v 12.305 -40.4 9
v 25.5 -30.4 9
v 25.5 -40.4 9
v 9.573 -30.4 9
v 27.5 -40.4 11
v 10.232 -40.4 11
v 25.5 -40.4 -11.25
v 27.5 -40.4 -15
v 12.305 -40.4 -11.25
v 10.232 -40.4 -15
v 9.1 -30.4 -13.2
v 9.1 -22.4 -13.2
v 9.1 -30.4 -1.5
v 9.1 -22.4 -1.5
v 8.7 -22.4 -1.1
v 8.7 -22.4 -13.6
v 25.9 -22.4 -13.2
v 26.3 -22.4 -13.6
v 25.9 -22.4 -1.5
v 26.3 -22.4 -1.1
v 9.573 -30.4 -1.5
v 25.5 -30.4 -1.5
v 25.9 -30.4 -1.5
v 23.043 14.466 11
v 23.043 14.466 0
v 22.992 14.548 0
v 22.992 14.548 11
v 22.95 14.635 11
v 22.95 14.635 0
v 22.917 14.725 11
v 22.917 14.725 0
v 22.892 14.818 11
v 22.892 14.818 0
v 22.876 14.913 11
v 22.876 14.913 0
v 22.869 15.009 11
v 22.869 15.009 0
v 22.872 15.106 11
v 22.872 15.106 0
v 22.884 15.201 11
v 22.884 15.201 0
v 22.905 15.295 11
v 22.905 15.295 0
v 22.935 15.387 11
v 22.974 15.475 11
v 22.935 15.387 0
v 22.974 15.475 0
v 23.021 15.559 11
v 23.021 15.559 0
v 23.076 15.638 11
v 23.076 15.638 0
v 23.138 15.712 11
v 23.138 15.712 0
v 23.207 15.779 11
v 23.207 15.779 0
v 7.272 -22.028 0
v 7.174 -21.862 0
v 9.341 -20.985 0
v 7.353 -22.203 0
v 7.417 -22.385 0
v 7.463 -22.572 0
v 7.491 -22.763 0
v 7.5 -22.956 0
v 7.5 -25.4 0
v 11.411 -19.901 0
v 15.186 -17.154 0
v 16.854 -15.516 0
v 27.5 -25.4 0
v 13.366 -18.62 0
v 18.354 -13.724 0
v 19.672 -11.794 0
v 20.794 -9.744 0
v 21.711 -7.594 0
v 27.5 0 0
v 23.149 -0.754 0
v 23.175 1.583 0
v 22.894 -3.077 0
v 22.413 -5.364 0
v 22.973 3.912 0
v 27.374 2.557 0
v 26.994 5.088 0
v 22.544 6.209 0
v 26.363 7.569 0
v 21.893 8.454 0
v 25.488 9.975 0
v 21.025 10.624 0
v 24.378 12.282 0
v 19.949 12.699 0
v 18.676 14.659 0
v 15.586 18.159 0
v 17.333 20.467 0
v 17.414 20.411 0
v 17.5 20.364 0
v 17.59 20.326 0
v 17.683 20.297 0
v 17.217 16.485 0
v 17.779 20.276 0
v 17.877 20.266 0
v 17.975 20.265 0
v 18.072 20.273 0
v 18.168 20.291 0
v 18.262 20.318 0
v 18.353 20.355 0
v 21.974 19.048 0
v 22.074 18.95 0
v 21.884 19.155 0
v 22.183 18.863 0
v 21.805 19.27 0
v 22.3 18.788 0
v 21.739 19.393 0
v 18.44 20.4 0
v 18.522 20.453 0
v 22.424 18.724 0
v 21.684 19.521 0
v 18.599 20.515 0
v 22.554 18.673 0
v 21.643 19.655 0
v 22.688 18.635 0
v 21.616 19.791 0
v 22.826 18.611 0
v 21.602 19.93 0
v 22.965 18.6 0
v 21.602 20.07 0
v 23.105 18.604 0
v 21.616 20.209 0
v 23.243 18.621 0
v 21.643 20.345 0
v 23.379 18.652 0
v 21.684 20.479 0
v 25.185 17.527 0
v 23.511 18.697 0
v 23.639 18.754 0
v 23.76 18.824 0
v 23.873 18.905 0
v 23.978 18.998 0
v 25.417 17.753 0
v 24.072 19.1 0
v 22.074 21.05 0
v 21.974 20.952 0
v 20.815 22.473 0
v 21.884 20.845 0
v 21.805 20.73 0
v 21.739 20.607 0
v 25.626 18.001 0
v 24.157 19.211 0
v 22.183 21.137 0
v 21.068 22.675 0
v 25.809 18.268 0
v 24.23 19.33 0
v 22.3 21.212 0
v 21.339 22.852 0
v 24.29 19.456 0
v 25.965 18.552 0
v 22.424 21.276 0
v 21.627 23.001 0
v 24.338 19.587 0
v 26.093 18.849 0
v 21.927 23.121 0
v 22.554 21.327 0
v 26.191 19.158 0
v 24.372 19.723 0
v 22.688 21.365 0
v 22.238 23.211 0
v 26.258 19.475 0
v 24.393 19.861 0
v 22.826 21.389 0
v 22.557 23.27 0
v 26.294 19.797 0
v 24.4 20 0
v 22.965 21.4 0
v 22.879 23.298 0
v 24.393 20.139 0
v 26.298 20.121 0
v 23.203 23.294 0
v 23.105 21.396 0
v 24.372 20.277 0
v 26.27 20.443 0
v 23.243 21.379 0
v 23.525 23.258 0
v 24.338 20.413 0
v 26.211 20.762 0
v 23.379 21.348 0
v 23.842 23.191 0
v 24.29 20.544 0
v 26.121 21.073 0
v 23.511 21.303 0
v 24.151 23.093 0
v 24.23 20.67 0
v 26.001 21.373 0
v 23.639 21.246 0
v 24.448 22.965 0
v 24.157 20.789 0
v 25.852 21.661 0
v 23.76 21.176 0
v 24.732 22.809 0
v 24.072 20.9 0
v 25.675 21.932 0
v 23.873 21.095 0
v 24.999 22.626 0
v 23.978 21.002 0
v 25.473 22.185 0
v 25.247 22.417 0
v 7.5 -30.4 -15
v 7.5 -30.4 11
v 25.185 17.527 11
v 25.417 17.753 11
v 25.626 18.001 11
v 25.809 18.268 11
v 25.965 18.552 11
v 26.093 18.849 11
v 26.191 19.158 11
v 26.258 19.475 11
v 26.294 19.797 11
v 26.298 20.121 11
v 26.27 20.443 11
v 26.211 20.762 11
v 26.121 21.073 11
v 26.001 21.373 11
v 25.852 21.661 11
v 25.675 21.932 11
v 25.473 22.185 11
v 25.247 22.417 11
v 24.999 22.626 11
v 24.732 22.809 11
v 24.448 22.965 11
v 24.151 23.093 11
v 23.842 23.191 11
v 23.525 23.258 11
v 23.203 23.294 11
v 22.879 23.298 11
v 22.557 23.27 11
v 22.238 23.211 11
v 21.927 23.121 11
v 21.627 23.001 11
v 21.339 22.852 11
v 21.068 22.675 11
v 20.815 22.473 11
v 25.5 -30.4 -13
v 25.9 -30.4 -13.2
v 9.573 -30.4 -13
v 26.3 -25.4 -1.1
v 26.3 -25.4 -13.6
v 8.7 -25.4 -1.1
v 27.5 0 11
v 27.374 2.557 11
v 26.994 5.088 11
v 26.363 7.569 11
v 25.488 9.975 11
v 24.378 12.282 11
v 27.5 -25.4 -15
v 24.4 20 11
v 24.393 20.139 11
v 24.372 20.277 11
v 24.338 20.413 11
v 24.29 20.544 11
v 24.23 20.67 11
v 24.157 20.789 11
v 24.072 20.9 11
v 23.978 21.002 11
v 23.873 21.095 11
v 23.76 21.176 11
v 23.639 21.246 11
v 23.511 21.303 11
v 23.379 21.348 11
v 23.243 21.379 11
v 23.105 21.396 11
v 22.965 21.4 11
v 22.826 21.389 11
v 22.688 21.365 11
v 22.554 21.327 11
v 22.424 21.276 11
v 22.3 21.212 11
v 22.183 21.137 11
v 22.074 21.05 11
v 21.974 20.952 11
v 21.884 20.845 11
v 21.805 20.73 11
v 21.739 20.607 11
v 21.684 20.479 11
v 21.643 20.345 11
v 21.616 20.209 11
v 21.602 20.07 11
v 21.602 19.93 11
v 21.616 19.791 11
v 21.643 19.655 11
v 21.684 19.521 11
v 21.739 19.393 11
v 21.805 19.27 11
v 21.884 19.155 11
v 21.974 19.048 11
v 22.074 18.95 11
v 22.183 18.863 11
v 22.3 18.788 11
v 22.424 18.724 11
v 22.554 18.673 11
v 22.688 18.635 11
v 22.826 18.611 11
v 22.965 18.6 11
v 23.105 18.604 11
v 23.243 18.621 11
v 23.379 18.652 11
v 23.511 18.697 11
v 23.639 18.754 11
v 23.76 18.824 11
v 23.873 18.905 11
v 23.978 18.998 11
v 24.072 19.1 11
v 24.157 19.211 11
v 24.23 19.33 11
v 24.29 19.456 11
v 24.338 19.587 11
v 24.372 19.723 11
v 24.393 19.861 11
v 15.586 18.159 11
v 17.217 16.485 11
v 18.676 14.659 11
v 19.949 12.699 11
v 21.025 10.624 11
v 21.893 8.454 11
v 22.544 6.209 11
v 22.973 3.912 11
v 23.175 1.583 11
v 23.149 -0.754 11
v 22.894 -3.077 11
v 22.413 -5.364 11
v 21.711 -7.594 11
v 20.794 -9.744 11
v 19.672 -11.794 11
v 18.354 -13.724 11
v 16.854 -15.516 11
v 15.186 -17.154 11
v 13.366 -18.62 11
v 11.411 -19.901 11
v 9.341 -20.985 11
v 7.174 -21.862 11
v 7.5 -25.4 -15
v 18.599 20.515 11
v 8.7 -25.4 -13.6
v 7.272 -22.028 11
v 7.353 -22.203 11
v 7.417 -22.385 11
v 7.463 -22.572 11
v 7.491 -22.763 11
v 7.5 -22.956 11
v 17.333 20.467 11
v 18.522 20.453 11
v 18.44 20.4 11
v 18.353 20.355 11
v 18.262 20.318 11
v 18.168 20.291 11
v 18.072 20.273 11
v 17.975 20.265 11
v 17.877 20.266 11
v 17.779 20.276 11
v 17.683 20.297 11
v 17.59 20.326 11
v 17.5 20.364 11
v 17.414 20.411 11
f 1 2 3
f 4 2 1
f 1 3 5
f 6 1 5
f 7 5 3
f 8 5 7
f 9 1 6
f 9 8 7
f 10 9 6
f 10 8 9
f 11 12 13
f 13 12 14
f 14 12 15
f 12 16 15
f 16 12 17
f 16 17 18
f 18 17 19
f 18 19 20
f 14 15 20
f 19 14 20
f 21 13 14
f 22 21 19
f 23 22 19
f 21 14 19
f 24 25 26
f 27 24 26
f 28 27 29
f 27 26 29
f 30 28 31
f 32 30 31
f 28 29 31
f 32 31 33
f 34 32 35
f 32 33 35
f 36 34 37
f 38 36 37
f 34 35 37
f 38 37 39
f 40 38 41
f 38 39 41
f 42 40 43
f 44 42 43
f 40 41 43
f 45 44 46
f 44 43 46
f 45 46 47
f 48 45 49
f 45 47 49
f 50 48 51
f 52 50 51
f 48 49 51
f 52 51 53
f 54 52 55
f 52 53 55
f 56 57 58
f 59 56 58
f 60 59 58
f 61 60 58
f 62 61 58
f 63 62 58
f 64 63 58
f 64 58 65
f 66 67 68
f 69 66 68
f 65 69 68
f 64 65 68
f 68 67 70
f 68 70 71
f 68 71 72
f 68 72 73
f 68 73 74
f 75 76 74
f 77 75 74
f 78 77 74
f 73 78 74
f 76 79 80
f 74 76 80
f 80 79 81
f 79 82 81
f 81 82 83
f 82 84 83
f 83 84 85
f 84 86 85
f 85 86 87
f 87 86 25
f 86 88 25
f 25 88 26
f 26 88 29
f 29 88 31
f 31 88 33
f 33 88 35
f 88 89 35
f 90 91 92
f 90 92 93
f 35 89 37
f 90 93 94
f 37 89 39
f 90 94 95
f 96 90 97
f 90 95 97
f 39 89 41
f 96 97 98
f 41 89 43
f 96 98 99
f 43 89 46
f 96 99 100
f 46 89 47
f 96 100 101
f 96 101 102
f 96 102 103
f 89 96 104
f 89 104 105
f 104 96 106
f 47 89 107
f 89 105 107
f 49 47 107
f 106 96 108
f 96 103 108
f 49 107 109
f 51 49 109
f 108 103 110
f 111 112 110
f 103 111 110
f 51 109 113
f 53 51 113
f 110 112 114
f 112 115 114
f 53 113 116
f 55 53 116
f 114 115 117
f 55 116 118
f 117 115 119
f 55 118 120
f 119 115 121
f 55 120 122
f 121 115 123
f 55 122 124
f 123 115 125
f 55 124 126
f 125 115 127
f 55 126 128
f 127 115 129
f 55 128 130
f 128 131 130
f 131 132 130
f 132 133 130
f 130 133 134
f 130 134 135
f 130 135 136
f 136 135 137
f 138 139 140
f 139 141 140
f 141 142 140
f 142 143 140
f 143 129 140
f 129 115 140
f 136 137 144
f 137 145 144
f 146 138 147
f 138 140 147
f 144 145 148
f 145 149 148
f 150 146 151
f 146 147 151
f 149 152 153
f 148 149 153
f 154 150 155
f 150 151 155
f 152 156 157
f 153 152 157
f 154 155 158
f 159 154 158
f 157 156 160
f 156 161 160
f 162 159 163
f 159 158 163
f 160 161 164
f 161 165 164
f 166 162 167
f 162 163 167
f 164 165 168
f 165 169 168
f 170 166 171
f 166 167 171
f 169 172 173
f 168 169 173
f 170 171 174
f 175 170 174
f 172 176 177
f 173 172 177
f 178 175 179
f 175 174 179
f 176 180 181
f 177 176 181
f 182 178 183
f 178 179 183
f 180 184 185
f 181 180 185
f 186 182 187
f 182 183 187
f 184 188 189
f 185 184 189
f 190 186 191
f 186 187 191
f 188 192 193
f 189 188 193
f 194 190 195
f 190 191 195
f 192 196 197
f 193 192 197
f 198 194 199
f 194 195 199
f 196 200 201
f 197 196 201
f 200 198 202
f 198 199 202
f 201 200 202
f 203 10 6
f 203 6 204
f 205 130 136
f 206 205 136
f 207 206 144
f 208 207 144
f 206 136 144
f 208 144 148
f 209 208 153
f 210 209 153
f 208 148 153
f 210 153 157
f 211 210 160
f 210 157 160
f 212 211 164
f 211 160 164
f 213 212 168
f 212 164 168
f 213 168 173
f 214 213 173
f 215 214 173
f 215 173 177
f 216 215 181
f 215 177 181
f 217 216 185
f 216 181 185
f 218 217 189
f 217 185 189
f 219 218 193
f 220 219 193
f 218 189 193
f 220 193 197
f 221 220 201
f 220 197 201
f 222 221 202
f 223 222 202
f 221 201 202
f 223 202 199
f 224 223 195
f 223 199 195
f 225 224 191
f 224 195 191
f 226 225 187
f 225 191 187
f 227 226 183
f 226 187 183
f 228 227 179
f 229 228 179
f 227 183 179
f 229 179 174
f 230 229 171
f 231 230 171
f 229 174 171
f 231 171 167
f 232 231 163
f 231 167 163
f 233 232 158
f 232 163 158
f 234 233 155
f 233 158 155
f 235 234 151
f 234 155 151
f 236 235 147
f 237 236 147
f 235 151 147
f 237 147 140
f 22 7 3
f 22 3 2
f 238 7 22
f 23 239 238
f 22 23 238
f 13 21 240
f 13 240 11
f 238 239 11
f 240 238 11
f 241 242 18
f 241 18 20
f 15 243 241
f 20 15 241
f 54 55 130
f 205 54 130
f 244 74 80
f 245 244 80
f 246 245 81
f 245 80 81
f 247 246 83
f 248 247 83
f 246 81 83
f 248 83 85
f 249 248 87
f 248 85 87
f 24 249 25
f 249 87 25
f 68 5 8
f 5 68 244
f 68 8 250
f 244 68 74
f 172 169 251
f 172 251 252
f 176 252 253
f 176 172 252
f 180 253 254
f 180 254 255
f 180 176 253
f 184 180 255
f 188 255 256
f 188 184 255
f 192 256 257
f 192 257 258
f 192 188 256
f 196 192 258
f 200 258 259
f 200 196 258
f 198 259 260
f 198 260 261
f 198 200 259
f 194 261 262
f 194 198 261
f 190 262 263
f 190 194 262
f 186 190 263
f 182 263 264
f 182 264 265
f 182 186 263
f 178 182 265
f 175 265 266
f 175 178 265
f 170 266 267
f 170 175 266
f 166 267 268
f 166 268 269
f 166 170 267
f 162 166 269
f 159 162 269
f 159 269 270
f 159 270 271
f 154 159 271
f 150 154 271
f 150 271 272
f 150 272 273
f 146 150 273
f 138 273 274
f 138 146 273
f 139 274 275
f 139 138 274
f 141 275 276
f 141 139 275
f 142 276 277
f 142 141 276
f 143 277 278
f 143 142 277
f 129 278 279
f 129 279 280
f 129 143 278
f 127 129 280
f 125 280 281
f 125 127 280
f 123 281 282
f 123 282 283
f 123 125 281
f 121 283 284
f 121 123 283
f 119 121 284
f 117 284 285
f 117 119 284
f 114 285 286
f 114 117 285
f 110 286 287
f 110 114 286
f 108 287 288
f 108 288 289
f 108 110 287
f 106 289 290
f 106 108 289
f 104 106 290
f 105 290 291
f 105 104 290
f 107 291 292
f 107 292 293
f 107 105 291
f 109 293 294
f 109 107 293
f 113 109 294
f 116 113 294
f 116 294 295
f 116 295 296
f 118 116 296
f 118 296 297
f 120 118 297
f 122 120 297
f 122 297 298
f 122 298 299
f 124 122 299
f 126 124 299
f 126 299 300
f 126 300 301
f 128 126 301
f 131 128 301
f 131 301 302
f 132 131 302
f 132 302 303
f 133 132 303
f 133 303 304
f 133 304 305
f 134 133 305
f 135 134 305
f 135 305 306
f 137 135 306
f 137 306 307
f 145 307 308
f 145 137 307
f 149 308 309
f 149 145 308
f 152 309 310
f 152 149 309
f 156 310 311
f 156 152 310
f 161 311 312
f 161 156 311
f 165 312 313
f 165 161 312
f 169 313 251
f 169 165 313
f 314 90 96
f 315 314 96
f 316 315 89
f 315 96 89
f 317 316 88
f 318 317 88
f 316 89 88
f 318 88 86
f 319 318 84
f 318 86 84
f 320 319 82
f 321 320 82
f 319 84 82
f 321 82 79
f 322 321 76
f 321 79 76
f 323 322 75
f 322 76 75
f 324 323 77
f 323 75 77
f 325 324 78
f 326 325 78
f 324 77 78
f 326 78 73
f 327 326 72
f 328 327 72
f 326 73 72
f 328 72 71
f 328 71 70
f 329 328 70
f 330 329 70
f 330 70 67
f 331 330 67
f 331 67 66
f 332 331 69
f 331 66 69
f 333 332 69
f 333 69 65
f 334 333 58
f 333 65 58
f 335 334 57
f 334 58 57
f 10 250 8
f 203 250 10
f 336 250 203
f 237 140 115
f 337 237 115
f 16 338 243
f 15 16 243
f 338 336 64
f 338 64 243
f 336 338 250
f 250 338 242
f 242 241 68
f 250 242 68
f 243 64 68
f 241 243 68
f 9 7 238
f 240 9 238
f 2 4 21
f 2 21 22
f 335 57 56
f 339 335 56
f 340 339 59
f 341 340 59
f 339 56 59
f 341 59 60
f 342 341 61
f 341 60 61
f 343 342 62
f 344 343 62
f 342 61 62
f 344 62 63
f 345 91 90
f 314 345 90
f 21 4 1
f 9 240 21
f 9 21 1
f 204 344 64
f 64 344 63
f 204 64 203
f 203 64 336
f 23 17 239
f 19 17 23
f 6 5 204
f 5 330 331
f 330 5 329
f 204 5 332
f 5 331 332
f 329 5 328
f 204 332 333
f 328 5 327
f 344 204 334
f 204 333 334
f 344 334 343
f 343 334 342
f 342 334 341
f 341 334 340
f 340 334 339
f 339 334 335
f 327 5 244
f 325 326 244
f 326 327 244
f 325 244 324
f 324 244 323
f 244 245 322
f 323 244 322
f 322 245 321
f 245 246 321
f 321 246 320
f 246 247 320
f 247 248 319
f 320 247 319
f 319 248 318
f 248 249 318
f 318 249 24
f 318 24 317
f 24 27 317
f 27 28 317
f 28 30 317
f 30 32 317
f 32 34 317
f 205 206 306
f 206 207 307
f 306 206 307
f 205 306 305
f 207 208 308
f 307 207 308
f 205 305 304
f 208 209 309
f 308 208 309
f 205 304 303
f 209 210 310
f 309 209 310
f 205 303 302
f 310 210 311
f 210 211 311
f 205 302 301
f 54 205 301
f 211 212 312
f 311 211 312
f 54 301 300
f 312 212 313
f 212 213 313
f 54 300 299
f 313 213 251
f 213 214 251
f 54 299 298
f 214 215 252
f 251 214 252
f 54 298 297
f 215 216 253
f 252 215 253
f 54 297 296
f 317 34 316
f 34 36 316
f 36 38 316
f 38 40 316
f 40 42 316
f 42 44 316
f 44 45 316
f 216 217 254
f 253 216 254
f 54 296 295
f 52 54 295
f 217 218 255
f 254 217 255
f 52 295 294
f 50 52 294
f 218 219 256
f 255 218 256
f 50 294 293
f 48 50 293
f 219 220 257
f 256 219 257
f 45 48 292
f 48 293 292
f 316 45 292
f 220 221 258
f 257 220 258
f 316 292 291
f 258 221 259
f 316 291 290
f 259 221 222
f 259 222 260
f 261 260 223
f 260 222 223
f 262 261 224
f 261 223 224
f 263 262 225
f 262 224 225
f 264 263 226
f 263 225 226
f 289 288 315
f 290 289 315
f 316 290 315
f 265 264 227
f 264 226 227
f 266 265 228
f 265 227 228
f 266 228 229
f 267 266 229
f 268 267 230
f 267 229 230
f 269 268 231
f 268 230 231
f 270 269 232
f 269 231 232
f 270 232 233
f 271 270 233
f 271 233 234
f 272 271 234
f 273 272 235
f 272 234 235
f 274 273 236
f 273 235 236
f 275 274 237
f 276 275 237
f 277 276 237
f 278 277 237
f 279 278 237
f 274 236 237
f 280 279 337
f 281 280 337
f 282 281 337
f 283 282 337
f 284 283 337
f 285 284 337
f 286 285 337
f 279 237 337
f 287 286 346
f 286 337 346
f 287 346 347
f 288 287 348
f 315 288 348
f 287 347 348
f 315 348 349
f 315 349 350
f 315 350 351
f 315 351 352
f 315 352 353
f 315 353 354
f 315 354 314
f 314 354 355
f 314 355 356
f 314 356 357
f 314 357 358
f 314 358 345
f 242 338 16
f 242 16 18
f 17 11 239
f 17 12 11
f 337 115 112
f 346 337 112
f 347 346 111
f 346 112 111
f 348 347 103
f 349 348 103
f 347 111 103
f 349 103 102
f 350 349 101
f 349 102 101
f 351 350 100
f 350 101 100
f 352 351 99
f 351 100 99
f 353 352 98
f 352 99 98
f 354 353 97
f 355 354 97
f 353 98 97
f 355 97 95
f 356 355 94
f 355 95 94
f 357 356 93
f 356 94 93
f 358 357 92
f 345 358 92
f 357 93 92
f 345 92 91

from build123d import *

# Parameters (mm, degrees)
SKETCH1_R               = 1.4
BOSS_EXTRUDE1_DEPTH     = 11
SKETCH2_W               = 18.000000053
SKETCH2_H               = 12.9
SKETCH2_W_2             = 16.800000053
SKETCH2_H_2             = 11.7
BOSS_EXTRUDE2_DEPTH     = 3
SKETCH2_3_W             = 20
SKETCH2_3_H             = 11
SKETCH2_3_H_2           = 15
SKETCH2_3_W_2           = 18.000000053
SKETCH2_3_H_3           = 12.9
SKETCH2_3_W_3           = 16.800000053
SKETCH2_3_H_4           = 11.7
BOSS_EXTRUDE3_DEPTH     = 5
BOSS_EXTRUDE4_DEPTH     = 2
BOSS_EXTRUDE6_START     = -2
BOSS_EXTRUDE6_DEPTH     = 22
SKETCH4_3_W             = 2
SKETCH4_3_H             = 40
BOSS_EXTRUDE6_2_DEPTH   = 22
BOSS_EXTRUDE7_START     = -24
SKETCH4_4_W             = 2
SKETCH4_4_H             = 40
BOSS_EXTRUDE7_DEPTH     = 2
BOSS_EXTRUDE8_REACH     = 20.326
SKETCH2_5_W             = 18.000000053
SKETCH2_5_H             = 12.9
SKETCH2_5_W_2           = 17.600000053
SKETCH2_5_H_2           = 12.5
CUT_EXTRUDE_THIN6_DEPTH = 10
SKETCH11_W              = 50.134644107
SKETCH11_H              = 30
CUT_EXTRUDE6_DEPTH      = 27


with BuildPart() as part:
    # Sketch1 → Boss-Extrude1 (new body)
    with BuildSketch(Plane.XY):
        with BuildLine():
            Line((23.20688118, 15.778885673), (25.185252728, 17.527214018))
            ThreePointArc((25.185252728, 17.527214018), (25.472785982, 22.185252728), (20.814747272, 22.472785982))
            Line((20.814747272, 22.472785982), (18.598905377, 20.514600122))
            ThreePointArc((18.598905377, 20.514600122), (17.974550182, 20.264645495), (17.333078903, 20.466663618))
            Line((17.333078903, 20.466663618), (15.586200014, 18.159406728))
            ThreePointArc((15.586200014, 18.159406728), (22.681435087, -4.226534244), (7.174093823, -21.861586862))
            ThreePointArc((7.174093823, -21.861586862), (7.416792587, -22.384967182), (7.5, -22.955849111))
            Line((7.5, -22.955849111), (7.5, -25.4))
            Line((7.5, -25.4), (27.5, -25.4))
            Line((27.5, -25.4), (27.5, 0))
            ThreePointArc((27.5, 0), (26.362874376, 7.569397218), (23.04284729, 14.466226133))
            ThreePointArc((23.04284729, 14.466226133), (22.876796583, 15.153555184), (23.20688118, 15.778885673))
        make_face()
        with Locations((23, 20)):
            Circle(SKETCH1_R, mode=Mode.SUBTRACT)
    extrude(amount=BOSS_EXTRUDE1_DEPTH)



with BuildPart() as body_2:
    # Sketch2 → Boss-Extrude2 (new body)
    with BuildSketch(Plane.XZ.offset(25.4)):
        with Locations((17.500000027, -7.35)):
            Rectangle(SKETCH2_W, SKETCH2_H)
        with Locations((17.500000027, -7.35)):
            Rectangle(SKETCH2_W_2, SKETCH2_H_2, mode=Mode.SUBTRACT)
    extrude(amount=-BOSS_EXTRUDE2_DEPTH)


with BuildPart() as part_1:
    add(part.part)

    add(body_2.part)  # Boss-Extrude3 merges body 2
    # Sketch2<3> → Boss-Extrude3 (add)
    with BuildSketch(Plane.XZ.offset(25.4)):
        with Locations((17.5, 5.5)):
            Rectangle(SKETCH2_3_W, SKETCH2_3_H)
        with Locations((17.5, -7.5)):
            Rectangle(SKETCH2_3_W, SKETCH2_3_H_2)
        with Locations((17.500000027, -7.35)):
            Rectangle(SKETCH2_3_W_2, SKETCH2_3_H_3, mode=Mode.SUBTRACT)
        with Locations((17.500000027, -7.35)):
            Rectangle(SKETCH2_3_W_2, SKETCH2_3_H_3)
        with Locations((17.500000027, -7.35)):
            Rectangle(SKETCH2_3_W_3, SKETCH2_3_H_4, mode=Mode.SUBTRACT)
    extrude(amount=BOSS_EXTRUDE3_DEPTH)

    # Sketch4 → Boss-Extrude4 (add)
    with BuildSketch(Plane(origin=(0, 0, -15), x_dir=(-1, 0, 0), z_dir=(0, 0, -1))):
        Polygon((-18.42672165, -70.4), (-7.5, -30.4), (-27.5, -30.4), (-27.5, -70.4), align=None)
    extrude(amount=-BOSS_EXTRUDE4_DEPTH)



with BuildPart() as body_2_2:
    # Sketch4<3> → Boss-Extrude6 (new body)
    with BuildSketch(Plane(origin=(0, 0, -15), x_dir=(-1, 0, 0), z_dir=(0, 0, -1)).offset(BOSS_EXTRUDE6_START)):
        Polygon((-18.42672165, -70.4), (-7.5, -30.4), (-9.57327835, -30.4), (-20.5, -70.4), align=None)
    extrude(amount=-BOSS_EXTRUDE6_DEPTH)


with BuildPart() as body_3:
    # Sketch4<3> → Boss-Extrude6 2 (new body)
    with BuildSketch(Plane(origin=(0, 0, -15), x_dir=(-1, 0, 0), z_dir=(0, 0, -1)).offset(BOSS_EXTRUDE6_START)):
        with Locations((-26.5, -50.4)):
            Rectangle(SKETCH4_3_W, SKETCH4_3_H)
    extrude(amount=-BOSS_EXTRUDE6_2_DEPTH)


with BuildPart() as part_2:
    add(part_1.part)

    add(body_2_2.part)  # Boss-Extrude7 merges body 2 2

    add(body_3.part)  # Boss-Extrude7 merges body 3
    # Sketch4<4> → Boss-Extrude7 (add)
    with BuildSketch(Plane(origin=(0, 0, -15), x_dir=(-1, 0, 0), z_dir=(0, 0, -1)).offset(BOSS_EXTRUDE7_START)):
        Polygon((-20.5, -70.4), (-9.57327835, -30.4), (-25.5, -30.4), (-25.5, -70.4), align=None)
        Polygon((-18.42672165, -70.4), (-7.5, -30.4), (-9.57327835, -30.4), (-20.5, -70.4), align=None)
        with Locations((-26.5, -50.4)):
            Rectangle(SKETCH4_4_W, SKETCH4_4_H)
    extrude(amount=-BOSS_EXTRUDE7_DEPTH)

    # Boss-Extrude8: up to this face of the body (flat: up to its plane)
    boss_extrude8_end = Plane(part_2.part.faces().sort_by_distance((15.036639175, -50.4, -2))[0])
    # Sketch8 → Boss-Extrude8 (add, up to the picked face)
    with BuildSketch(Plane.ZY.offset(-25.5), mode=Mode.PRIVATE) as boss_extrude8_sk1:
        Polygon((-13, -70.4), (-6, -70.4), (-13, -30.4), align=None)
    boss_extrude8_tool1 = split(extrude(boss_extrude8_sk1.sketch, amount=BOSS_EXTRUDE8_REACH, mode=Mode.PRIVATE), bisect_by=boss_extrude8_end, keep=Keep.BOTH, mode=Mode.PRIVATE)
    add(boss_extrude8_tool1.solids().sort_by_distance((25.5, -57.066667, -10.666667))[0])

    # Sketch2<5> → Cut-Extrude-Thin6 (cut)
    with BuildSketch(Plane.XZ.offset(25.4)):
        with Locations((17.500000027, -7.35)):
            Rectangle(SKETCH2_5_W, SKETCH2_5_H)
        with Locations((17.500000027, -7.35)):
            Rectangle(SKETCH2_5_W_2, SKETCH2_5_H_2, mode=Mode.SUBTRACT)
    extrude(amount=-CUT_EXTRUDE_THIN6_DEPTH, mode=Mode.SUBTRACT)

    # Sketch11 → Cut-Extrude6 (cut, through all)
    with BuildSketch(Plane(origin=(0, 0, -15), x_dir=(-1, 0, 0), z_dir=(0, 0, -1))):
        with Locations((-25.067322053, -55.4)):
            Rectangle(SKETCH11_W, SKETCH11_H)
    extrude(amount=-CUT_EXTRUDE6_DEPTH, mode=Mode.SUBTRACT)


solid = part_2.part
